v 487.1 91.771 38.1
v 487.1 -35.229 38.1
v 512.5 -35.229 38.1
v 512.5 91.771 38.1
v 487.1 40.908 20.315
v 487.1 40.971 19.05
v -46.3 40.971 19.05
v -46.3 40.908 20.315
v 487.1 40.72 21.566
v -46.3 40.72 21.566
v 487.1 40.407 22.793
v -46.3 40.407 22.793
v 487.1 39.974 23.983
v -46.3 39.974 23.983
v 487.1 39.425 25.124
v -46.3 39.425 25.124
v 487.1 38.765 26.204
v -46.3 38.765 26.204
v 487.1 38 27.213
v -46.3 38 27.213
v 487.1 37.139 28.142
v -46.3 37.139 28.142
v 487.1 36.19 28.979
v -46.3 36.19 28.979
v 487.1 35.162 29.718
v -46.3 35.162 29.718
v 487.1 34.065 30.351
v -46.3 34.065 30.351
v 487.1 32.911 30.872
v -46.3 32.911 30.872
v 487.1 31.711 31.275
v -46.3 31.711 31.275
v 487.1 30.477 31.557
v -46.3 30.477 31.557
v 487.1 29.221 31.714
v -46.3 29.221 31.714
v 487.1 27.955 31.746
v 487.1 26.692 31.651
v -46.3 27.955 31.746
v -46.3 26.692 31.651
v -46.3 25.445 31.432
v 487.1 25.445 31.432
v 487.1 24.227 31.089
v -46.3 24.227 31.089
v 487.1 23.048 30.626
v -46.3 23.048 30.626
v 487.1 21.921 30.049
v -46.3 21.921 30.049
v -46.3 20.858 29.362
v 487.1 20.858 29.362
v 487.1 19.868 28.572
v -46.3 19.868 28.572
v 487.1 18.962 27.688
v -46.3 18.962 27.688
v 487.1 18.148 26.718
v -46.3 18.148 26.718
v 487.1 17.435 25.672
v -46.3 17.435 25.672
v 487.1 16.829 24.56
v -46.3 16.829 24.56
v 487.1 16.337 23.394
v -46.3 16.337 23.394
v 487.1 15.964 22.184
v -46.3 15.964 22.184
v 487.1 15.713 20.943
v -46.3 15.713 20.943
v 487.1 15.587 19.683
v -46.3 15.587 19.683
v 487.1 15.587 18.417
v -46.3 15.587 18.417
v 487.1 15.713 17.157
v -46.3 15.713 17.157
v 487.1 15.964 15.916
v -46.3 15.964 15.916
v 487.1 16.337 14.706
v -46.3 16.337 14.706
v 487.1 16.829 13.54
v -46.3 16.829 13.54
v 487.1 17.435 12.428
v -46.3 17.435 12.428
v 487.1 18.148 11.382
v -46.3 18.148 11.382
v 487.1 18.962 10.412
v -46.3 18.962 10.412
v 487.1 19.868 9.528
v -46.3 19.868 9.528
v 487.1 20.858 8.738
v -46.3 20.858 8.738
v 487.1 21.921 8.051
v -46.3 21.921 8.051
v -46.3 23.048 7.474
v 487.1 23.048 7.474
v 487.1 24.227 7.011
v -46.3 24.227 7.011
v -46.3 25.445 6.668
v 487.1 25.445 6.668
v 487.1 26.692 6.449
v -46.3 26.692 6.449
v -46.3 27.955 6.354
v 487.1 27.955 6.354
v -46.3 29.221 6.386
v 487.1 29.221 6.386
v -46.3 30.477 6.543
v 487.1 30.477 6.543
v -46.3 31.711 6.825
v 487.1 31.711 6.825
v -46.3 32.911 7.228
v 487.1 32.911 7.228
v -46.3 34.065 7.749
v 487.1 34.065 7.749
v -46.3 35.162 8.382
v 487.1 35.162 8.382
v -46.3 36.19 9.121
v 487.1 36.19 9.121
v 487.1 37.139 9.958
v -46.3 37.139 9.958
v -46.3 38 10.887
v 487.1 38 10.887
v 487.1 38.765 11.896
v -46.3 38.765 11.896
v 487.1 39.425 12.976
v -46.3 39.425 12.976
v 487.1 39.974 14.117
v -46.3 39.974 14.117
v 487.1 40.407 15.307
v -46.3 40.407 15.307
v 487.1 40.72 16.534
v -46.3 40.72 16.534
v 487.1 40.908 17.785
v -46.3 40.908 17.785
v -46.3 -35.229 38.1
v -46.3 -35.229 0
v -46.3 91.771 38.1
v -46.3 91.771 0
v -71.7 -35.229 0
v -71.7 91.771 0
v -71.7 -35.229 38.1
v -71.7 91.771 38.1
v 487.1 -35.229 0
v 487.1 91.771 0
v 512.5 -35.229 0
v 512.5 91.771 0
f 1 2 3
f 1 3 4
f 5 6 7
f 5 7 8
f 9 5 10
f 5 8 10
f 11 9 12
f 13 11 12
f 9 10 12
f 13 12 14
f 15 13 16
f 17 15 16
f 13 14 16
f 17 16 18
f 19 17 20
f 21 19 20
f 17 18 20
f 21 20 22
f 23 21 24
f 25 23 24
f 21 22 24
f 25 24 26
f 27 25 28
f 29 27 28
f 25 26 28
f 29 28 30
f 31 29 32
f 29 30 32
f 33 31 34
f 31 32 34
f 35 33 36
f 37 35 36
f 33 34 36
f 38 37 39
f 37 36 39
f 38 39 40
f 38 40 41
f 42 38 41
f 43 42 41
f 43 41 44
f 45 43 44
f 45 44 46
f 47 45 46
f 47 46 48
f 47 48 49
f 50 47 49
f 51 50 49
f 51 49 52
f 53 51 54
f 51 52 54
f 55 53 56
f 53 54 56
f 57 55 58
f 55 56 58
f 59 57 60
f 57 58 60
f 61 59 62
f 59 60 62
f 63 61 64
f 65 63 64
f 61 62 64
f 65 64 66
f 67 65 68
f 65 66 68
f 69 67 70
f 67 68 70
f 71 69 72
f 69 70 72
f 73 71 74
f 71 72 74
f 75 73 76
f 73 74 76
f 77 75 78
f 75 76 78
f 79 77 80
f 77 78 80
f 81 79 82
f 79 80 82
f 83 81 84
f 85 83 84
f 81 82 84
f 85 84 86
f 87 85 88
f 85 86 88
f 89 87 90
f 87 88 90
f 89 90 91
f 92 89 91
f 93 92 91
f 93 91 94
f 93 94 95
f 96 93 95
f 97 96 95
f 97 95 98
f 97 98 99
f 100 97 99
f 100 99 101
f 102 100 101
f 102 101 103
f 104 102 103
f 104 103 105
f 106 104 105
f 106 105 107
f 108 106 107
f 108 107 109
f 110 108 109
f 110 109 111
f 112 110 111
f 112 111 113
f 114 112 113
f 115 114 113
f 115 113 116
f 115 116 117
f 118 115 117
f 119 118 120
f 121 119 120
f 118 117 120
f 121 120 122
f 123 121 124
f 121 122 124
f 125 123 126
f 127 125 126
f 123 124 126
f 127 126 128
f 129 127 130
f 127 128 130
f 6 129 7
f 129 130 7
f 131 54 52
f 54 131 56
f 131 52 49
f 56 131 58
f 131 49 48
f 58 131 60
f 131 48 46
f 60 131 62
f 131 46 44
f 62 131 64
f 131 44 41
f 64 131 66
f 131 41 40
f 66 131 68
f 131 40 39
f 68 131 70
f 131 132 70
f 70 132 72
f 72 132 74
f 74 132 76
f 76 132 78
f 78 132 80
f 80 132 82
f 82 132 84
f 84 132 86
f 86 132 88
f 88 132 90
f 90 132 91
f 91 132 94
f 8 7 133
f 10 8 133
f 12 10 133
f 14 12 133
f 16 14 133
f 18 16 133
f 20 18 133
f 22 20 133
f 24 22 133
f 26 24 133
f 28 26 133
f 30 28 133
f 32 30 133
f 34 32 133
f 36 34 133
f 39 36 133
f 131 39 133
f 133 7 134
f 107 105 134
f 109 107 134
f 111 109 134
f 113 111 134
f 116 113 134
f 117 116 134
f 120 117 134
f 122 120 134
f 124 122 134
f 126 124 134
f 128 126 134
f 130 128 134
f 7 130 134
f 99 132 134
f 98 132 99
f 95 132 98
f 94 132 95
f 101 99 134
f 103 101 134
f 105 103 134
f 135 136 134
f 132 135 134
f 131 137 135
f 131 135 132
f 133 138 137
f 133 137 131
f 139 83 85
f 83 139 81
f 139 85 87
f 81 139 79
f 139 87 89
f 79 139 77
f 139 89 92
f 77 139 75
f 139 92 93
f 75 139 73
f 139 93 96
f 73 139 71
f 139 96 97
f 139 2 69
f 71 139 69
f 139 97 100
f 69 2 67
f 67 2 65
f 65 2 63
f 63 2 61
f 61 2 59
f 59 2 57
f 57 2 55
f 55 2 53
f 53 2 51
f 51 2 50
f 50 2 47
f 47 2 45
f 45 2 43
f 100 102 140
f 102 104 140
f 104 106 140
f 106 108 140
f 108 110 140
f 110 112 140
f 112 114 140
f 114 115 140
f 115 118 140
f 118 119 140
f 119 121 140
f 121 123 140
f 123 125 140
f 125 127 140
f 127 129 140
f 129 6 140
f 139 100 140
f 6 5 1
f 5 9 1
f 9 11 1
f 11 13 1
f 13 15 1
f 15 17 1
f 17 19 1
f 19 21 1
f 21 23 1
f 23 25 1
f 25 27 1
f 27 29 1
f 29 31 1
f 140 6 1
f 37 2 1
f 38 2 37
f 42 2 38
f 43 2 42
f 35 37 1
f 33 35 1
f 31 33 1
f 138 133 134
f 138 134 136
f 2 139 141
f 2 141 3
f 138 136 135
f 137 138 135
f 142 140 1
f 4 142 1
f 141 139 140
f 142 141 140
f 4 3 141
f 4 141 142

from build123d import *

# Parameters (mm, degrees)
F1_DEPTH = 38.1
F2_R     = 12.7
F3_DEPTH = 533.4
F4_W     = 127
F4_H     = 38.1
F5_DEPTH = 25.4


with BuildPart() as f1:
    # F0 (on Top) → F1 (new body)
    with BuildSketch(Plane.XY):
        Polygon((-46.300181, 91.77144), (-71.700181, 91.77144), (-71.700181, -35.22856), (-46.300181, -35.22856), (-46.300181, 15.57144), (-46.300181, 40.97144), align=None)
    extrude(amount=F1_DEPTH)

    # F2 (on face) → F3 (join)
    with BuildSketch(Plane.YZ.offset(-46.300181)):
        with Locations((28.27144, 19.05)):
            Circle(F2_R)
    extrude(amount=F3_DEPTH)

    # F4 (on face) → F5 (join)
    with BuildSketch(Plane.YZ.offset(487.099819)):
        with Locations((28.27144, 19.05)):
            Rectangle(F4_W, F4_H)
    extrude(amount=F5_DEPTH)


solid = f1.part
